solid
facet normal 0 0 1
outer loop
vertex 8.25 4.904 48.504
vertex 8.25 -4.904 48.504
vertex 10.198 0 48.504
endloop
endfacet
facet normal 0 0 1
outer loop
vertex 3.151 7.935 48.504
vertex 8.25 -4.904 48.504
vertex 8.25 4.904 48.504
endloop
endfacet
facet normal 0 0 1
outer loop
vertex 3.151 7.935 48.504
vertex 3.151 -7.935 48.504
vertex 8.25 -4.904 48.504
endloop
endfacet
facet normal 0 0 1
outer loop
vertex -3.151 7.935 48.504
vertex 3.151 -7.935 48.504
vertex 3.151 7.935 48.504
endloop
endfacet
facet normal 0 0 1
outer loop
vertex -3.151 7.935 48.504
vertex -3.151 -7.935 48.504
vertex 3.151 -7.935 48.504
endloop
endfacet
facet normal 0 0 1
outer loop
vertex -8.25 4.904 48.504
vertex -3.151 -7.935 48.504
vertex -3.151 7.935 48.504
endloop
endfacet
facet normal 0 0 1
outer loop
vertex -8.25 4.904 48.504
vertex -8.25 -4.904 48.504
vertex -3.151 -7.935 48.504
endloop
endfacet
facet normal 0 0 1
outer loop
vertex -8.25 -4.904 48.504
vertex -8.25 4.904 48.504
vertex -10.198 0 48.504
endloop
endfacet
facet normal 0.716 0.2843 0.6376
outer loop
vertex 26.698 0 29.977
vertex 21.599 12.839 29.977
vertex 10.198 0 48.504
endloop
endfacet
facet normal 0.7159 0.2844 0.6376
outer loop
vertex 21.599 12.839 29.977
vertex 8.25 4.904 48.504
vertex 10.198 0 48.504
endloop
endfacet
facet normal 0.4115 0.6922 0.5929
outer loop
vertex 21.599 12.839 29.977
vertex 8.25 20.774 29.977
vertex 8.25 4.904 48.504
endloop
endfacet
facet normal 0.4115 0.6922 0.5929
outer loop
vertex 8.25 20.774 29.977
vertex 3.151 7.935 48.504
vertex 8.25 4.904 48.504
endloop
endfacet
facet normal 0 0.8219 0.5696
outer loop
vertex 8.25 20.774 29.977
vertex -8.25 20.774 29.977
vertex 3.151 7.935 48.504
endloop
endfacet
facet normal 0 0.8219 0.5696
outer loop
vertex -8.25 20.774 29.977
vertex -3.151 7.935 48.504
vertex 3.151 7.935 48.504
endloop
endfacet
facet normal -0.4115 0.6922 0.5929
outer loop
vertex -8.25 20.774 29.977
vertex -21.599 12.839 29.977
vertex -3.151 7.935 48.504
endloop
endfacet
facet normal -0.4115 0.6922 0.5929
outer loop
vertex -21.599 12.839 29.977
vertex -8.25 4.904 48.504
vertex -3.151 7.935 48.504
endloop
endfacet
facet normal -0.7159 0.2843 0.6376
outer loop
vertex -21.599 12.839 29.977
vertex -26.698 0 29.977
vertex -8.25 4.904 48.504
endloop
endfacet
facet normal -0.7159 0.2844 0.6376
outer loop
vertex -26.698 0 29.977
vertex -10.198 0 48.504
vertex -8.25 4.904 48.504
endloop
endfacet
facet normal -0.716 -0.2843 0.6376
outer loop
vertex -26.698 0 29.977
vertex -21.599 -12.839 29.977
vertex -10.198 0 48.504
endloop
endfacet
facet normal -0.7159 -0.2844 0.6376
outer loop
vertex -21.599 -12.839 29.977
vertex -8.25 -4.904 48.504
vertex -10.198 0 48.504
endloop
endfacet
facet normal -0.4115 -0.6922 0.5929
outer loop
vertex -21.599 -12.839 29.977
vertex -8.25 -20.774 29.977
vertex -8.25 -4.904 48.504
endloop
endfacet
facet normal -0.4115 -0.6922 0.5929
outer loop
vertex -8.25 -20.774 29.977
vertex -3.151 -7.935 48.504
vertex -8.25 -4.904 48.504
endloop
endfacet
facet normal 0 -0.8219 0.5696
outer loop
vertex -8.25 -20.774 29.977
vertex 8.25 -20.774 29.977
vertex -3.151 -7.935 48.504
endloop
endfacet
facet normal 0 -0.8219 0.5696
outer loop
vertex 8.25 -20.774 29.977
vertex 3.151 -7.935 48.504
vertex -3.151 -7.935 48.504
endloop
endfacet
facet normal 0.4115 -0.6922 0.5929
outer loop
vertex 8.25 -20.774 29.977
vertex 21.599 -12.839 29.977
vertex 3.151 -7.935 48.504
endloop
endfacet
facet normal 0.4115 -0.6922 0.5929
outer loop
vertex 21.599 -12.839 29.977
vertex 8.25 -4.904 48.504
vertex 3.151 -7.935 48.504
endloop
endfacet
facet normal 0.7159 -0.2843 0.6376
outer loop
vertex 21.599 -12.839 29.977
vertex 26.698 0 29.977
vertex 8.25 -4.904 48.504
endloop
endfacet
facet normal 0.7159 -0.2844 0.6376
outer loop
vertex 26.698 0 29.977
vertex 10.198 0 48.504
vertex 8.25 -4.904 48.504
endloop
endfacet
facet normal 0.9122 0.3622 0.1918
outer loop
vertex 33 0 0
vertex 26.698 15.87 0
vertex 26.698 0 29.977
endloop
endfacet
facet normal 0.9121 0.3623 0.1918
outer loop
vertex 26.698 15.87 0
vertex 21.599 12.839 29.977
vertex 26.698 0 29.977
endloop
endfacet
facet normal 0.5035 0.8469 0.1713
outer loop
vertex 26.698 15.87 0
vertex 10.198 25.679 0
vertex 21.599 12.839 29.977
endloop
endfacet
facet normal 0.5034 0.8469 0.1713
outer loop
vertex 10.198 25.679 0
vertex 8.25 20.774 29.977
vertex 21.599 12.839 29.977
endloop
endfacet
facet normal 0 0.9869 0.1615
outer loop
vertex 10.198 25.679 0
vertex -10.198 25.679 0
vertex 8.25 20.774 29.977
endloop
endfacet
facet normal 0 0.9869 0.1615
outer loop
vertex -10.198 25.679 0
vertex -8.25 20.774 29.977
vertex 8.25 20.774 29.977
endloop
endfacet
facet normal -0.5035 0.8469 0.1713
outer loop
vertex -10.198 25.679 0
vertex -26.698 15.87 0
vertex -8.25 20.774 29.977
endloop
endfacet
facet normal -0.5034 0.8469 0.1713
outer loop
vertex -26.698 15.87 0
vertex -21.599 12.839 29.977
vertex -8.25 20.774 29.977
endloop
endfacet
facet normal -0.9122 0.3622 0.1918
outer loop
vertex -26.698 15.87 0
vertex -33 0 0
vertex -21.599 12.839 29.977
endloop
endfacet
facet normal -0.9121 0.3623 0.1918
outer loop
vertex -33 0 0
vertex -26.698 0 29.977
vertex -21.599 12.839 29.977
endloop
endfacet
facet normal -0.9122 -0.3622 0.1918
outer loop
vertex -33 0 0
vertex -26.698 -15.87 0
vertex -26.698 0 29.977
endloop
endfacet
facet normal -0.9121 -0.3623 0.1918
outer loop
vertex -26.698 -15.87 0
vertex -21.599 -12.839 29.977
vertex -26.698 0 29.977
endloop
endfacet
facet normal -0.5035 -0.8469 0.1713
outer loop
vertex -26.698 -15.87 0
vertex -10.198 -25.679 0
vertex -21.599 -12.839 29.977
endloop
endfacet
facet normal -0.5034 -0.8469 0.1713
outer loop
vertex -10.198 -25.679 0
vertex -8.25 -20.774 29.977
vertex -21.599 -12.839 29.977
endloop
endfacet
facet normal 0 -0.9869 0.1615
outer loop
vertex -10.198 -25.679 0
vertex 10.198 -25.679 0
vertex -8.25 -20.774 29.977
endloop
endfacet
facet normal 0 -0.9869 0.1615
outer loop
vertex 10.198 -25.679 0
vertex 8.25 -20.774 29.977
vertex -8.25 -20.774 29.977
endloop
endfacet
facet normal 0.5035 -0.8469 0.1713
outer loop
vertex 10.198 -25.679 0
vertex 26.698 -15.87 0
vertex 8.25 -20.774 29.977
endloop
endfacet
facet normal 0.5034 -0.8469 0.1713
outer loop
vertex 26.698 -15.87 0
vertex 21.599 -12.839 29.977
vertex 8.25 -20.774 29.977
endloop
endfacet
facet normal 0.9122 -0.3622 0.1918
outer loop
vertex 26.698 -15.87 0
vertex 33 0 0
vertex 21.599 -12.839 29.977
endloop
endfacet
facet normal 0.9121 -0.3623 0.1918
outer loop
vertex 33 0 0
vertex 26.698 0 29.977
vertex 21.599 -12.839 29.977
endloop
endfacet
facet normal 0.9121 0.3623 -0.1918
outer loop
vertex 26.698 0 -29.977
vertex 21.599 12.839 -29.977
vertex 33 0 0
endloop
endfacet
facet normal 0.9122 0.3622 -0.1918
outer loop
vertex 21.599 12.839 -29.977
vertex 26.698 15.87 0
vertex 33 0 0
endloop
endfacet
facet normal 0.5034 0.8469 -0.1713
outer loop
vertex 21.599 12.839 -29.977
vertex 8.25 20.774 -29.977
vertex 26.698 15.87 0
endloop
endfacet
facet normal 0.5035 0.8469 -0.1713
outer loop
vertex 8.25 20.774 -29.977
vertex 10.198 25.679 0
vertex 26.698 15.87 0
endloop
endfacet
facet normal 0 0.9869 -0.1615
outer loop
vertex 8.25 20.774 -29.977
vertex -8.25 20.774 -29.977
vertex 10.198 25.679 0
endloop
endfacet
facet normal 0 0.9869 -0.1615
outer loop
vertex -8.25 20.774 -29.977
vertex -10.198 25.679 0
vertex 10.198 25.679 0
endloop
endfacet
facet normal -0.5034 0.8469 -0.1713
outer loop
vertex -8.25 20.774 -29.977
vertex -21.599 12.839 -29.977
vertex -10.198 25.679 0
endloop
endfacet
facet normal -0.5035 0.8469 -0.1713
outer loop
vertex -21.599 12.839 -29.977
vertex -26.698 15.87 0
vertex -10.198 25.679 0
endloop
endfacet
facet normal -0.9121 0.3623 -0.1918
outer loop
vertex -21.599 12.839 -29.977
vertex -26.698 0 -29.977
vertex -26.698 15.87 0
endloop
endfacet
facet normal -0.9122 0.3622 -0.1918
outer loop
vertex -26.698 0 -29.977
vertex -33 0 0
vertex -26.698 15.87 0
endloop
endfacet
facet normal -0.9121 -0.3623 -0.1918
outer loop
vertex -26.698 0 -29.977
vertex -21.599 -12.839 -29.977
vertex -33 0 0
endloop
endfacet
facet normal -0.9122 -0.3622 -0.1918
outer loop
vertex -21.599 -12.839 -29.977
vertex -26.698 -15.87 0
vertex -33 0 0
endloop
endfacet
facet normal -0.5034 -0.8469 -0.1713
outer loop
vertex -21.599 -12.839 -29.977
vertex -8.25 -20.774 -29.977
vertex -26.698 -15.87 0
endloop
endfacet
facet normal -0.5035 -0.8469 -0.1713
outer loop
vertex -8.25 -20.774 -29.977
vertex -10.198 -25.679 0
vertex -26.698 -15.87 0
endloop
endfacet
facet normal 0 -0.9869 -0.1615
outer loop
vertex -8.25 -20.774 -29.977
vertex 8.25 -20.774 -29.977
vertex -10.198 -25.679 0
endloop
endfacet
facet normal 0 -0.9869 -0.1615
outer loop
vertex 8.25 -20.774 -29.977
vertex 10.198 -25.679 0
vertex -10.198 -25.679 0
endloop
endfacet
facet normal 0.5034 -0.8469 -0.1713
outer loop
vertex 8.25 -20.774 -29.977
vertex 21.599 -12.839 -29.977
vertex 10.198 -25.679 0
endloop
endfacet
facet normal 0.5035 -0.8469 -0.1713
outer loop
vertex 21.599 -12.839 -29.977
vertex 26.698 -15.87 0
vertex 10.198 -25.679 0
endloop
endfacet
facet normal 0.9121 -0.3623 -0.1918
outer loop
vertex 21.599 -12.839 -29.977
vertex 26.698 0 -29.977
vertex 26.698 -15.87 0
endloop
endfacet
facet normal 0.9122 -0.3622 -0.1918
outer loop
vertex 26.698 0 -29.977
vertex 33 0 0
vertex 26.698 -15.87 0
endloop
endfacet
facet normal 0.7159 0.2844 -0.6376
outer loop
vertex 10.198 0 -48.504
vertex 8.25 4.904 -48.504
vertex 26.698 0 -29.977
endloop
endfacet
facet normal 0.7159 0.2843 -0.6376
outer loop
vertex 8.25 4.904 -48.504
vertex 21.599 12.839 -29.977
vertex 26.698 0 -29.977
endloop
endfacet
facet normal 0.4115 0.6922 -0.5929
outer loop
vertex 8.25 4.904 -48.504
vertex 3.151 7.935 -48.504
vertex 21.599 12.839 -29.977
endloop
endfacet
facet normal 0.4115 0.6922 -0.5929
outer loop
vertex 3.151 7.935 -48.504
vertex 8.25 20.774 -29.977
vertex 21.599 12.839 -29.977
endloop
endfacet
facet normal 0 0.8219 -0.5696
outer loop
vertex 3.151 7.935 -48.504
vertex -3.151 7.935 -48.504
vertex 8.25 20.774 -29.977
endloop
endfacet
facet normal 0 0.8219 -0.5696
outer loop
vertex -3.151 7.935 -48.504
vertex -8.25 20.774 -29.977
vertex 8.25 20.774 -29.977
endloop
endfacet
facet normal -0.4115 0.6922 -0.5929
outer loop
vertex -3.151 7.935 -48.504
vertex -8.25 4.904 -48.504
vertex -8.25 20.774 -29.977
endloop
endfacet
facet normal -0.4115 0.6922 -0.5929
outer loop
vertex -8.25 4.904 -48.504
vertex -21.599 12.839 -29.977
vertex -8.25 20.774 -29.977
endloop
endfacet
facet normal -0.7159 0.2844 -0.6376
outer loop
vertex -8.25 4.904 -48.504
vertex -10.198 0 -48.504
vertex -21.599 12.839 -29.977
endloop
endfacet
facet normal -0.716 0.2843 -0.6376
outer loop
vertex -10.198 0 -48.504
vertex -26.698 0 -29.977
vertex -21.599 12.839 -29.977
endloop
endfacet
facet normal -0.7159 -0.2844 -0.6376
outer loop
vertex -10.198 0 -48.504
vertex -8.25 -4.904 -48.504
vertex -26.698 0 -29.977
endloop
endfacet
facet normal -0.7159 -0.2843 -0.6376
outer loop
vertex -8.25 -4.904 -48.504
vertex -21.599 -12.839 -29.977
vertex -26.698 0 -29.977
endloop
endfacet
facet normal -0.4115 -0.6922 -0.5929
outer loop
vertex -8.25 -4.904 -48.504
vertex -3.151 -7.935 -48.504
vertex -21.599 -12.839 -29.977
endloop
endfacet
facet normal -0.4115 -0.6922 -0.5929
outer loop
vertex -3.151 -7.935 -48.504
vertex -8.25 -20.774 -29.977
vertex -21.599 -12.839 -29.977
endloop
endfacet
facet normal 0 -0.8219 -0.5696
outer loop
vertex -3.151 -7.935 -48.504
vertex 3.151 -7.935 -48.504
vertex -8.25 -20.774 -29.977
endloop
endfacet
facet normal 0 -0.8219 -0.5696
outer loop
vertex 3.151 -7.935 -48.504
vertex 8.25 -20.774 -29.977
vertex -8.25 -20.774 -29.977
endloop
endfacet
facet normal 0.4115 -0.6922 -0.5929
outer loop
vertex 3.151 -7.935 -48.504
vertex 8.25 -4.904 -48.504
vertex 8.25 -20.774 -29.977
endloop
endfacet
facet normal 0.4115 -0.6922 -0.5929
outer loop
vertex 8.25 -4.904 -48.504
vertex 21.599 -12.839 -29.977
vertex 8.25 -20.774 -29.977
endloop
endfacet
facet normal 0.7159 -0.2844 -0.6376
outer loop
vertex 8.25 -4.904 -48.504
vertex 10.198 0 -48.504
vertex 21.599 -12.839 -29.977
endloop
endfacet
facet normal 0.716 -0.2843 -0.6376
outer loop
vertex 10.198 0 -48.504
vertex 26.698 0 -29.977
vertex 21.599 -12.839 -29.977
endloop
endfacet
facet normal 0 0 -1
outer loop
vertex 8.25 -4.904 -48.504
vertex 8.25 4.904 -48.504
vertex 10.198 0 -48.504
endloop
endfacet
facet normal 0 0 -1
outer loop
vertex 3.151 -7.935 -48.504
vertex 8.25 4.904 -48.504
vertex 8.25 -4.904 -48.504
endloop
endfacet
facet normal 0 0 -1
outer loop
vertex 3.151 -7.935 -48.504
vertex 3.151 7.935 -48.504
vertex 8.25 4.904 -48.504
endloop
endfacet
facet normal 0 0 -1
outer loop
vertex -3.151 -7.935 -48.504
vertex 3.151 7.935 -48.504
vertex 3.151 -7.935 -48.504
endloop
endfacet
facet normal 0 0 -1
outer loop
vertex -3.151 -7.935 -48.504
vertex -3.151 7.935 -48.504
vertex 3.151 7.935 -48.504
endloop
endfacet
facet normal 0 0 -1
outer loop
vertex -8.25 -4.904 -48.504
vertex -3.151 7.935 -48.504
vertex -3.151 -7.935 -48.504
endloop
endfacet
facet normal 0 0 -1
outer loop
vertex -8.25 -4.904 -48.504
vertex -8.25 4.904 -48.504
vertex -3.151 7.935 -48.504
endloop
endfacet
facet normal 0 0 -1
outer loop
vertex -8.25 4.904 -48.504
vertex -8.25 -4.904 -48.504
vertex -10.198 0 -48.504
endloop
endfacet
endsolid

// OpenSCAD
// Generated by SolidPython 1.0.1 on 2020-07-29 00:46:49


scale(v = [11, 9, 17]) {
	sphere(r = 3);
}
/***********************************************
*********      SolidPython code:      **********
************************************************
 
# import packages: SolidPython
from solid import *
from solid.utils import *
from itertools import chain, combinations, permutations


class Resize:

    def __init__(self, scad_file):
        self.scad_file = scad_file
        #self.scad_file = import_scad(scad_file)
        # cone/cylinder param:
        self.r1 = 0
        self.r2 = 0
        self.h = 0
        # rectangular prism param:
        self.w = 0
        self.l = 0
        # ellipse param:
        self.r = 0

    # import OpenScad code (file name corresponds to shape)


    # classify shape + parameters
    def assign(self, param1, param2, param3):
        if self.scad_file == 'cone.scad':
            self.r1 = param1
            self.r2 = param2
            self.h = param3
        elif self.scad_file == 'cylinder.scad':
            self.r1 = param1
            self.r2 = param2
            self.h = param3
        elif self.scad_file == 'rectangularPrism.scad':
            self.h = param1
            self.l = param2
            self.w = param3
        else:
            self.r = param1
            self.h = param2

    # resize parameters
    def iterate(self):
        x = range(3, 20, 2)
        i = 1
        if self.scad_file == 'cone.scad':
            tempList = list(permutations(x, 2))
            for temp in tempList:
                param1 = temp[0]
                param2 = temp[1]
                filepath = 'produced_scad_files/' + 'cone' + str(param1) + '_' + str(param2) + '_' + '.scad'
                scad_render_to_file(cylinder(h=param1, r1=param2, r2=0), filepath)

        elif self.scad_file == 'cylinder.scad':
            tempList = list(permutations(x, 3))
            for temp in tempList:
                param1 = temp[0]
                param2 = temp[1]
                filepath = 'produced_scad_files/' + 'cylinder' + str(param1) + '_' + str(param2) + '_' + '.scad'
                scad_render_to_file(cylinder(h=param1, r1=param2, r2=param2), filepath)

        elif self.scad_file == 'rectangularPrism.scad':
            tempList = list(permutations(x, 3))
            for temp in tempList:
                param1 = temp[0]
                param2 = temp[1]
                param3 = temp[2]
                filepath = 'produced_scad_files/' + 'rectangularPrism' + str(param1) + '_' + str(param2) + '_' + str(
                    param3) + '.scad'
                scad_render_to_file(cube(size=(param1, param2, param3)), filepath)

        elif self.scad_file == 'ellipse.scad':
            tempList = list(permutations(x, 4))
            for temp in tempList:
                param1 = temp[0]
                param2 = temp[1]
                param3 = temp[2]
                param4 = temp[3]
                filepath = 'produced_scad_files/' + 'ellipse' + str(param1) + '_' + str(param2) + '_' + str(param3) + '_' + str(param4) + '.scad'
                scad_render_to_file(scale([param1, param2, param3])(sphere(r=param4)), filepath)

    def render_to_scadfile(self):
        scad_render_to_file(scad, 'example.scad') 
 
************************************************/
